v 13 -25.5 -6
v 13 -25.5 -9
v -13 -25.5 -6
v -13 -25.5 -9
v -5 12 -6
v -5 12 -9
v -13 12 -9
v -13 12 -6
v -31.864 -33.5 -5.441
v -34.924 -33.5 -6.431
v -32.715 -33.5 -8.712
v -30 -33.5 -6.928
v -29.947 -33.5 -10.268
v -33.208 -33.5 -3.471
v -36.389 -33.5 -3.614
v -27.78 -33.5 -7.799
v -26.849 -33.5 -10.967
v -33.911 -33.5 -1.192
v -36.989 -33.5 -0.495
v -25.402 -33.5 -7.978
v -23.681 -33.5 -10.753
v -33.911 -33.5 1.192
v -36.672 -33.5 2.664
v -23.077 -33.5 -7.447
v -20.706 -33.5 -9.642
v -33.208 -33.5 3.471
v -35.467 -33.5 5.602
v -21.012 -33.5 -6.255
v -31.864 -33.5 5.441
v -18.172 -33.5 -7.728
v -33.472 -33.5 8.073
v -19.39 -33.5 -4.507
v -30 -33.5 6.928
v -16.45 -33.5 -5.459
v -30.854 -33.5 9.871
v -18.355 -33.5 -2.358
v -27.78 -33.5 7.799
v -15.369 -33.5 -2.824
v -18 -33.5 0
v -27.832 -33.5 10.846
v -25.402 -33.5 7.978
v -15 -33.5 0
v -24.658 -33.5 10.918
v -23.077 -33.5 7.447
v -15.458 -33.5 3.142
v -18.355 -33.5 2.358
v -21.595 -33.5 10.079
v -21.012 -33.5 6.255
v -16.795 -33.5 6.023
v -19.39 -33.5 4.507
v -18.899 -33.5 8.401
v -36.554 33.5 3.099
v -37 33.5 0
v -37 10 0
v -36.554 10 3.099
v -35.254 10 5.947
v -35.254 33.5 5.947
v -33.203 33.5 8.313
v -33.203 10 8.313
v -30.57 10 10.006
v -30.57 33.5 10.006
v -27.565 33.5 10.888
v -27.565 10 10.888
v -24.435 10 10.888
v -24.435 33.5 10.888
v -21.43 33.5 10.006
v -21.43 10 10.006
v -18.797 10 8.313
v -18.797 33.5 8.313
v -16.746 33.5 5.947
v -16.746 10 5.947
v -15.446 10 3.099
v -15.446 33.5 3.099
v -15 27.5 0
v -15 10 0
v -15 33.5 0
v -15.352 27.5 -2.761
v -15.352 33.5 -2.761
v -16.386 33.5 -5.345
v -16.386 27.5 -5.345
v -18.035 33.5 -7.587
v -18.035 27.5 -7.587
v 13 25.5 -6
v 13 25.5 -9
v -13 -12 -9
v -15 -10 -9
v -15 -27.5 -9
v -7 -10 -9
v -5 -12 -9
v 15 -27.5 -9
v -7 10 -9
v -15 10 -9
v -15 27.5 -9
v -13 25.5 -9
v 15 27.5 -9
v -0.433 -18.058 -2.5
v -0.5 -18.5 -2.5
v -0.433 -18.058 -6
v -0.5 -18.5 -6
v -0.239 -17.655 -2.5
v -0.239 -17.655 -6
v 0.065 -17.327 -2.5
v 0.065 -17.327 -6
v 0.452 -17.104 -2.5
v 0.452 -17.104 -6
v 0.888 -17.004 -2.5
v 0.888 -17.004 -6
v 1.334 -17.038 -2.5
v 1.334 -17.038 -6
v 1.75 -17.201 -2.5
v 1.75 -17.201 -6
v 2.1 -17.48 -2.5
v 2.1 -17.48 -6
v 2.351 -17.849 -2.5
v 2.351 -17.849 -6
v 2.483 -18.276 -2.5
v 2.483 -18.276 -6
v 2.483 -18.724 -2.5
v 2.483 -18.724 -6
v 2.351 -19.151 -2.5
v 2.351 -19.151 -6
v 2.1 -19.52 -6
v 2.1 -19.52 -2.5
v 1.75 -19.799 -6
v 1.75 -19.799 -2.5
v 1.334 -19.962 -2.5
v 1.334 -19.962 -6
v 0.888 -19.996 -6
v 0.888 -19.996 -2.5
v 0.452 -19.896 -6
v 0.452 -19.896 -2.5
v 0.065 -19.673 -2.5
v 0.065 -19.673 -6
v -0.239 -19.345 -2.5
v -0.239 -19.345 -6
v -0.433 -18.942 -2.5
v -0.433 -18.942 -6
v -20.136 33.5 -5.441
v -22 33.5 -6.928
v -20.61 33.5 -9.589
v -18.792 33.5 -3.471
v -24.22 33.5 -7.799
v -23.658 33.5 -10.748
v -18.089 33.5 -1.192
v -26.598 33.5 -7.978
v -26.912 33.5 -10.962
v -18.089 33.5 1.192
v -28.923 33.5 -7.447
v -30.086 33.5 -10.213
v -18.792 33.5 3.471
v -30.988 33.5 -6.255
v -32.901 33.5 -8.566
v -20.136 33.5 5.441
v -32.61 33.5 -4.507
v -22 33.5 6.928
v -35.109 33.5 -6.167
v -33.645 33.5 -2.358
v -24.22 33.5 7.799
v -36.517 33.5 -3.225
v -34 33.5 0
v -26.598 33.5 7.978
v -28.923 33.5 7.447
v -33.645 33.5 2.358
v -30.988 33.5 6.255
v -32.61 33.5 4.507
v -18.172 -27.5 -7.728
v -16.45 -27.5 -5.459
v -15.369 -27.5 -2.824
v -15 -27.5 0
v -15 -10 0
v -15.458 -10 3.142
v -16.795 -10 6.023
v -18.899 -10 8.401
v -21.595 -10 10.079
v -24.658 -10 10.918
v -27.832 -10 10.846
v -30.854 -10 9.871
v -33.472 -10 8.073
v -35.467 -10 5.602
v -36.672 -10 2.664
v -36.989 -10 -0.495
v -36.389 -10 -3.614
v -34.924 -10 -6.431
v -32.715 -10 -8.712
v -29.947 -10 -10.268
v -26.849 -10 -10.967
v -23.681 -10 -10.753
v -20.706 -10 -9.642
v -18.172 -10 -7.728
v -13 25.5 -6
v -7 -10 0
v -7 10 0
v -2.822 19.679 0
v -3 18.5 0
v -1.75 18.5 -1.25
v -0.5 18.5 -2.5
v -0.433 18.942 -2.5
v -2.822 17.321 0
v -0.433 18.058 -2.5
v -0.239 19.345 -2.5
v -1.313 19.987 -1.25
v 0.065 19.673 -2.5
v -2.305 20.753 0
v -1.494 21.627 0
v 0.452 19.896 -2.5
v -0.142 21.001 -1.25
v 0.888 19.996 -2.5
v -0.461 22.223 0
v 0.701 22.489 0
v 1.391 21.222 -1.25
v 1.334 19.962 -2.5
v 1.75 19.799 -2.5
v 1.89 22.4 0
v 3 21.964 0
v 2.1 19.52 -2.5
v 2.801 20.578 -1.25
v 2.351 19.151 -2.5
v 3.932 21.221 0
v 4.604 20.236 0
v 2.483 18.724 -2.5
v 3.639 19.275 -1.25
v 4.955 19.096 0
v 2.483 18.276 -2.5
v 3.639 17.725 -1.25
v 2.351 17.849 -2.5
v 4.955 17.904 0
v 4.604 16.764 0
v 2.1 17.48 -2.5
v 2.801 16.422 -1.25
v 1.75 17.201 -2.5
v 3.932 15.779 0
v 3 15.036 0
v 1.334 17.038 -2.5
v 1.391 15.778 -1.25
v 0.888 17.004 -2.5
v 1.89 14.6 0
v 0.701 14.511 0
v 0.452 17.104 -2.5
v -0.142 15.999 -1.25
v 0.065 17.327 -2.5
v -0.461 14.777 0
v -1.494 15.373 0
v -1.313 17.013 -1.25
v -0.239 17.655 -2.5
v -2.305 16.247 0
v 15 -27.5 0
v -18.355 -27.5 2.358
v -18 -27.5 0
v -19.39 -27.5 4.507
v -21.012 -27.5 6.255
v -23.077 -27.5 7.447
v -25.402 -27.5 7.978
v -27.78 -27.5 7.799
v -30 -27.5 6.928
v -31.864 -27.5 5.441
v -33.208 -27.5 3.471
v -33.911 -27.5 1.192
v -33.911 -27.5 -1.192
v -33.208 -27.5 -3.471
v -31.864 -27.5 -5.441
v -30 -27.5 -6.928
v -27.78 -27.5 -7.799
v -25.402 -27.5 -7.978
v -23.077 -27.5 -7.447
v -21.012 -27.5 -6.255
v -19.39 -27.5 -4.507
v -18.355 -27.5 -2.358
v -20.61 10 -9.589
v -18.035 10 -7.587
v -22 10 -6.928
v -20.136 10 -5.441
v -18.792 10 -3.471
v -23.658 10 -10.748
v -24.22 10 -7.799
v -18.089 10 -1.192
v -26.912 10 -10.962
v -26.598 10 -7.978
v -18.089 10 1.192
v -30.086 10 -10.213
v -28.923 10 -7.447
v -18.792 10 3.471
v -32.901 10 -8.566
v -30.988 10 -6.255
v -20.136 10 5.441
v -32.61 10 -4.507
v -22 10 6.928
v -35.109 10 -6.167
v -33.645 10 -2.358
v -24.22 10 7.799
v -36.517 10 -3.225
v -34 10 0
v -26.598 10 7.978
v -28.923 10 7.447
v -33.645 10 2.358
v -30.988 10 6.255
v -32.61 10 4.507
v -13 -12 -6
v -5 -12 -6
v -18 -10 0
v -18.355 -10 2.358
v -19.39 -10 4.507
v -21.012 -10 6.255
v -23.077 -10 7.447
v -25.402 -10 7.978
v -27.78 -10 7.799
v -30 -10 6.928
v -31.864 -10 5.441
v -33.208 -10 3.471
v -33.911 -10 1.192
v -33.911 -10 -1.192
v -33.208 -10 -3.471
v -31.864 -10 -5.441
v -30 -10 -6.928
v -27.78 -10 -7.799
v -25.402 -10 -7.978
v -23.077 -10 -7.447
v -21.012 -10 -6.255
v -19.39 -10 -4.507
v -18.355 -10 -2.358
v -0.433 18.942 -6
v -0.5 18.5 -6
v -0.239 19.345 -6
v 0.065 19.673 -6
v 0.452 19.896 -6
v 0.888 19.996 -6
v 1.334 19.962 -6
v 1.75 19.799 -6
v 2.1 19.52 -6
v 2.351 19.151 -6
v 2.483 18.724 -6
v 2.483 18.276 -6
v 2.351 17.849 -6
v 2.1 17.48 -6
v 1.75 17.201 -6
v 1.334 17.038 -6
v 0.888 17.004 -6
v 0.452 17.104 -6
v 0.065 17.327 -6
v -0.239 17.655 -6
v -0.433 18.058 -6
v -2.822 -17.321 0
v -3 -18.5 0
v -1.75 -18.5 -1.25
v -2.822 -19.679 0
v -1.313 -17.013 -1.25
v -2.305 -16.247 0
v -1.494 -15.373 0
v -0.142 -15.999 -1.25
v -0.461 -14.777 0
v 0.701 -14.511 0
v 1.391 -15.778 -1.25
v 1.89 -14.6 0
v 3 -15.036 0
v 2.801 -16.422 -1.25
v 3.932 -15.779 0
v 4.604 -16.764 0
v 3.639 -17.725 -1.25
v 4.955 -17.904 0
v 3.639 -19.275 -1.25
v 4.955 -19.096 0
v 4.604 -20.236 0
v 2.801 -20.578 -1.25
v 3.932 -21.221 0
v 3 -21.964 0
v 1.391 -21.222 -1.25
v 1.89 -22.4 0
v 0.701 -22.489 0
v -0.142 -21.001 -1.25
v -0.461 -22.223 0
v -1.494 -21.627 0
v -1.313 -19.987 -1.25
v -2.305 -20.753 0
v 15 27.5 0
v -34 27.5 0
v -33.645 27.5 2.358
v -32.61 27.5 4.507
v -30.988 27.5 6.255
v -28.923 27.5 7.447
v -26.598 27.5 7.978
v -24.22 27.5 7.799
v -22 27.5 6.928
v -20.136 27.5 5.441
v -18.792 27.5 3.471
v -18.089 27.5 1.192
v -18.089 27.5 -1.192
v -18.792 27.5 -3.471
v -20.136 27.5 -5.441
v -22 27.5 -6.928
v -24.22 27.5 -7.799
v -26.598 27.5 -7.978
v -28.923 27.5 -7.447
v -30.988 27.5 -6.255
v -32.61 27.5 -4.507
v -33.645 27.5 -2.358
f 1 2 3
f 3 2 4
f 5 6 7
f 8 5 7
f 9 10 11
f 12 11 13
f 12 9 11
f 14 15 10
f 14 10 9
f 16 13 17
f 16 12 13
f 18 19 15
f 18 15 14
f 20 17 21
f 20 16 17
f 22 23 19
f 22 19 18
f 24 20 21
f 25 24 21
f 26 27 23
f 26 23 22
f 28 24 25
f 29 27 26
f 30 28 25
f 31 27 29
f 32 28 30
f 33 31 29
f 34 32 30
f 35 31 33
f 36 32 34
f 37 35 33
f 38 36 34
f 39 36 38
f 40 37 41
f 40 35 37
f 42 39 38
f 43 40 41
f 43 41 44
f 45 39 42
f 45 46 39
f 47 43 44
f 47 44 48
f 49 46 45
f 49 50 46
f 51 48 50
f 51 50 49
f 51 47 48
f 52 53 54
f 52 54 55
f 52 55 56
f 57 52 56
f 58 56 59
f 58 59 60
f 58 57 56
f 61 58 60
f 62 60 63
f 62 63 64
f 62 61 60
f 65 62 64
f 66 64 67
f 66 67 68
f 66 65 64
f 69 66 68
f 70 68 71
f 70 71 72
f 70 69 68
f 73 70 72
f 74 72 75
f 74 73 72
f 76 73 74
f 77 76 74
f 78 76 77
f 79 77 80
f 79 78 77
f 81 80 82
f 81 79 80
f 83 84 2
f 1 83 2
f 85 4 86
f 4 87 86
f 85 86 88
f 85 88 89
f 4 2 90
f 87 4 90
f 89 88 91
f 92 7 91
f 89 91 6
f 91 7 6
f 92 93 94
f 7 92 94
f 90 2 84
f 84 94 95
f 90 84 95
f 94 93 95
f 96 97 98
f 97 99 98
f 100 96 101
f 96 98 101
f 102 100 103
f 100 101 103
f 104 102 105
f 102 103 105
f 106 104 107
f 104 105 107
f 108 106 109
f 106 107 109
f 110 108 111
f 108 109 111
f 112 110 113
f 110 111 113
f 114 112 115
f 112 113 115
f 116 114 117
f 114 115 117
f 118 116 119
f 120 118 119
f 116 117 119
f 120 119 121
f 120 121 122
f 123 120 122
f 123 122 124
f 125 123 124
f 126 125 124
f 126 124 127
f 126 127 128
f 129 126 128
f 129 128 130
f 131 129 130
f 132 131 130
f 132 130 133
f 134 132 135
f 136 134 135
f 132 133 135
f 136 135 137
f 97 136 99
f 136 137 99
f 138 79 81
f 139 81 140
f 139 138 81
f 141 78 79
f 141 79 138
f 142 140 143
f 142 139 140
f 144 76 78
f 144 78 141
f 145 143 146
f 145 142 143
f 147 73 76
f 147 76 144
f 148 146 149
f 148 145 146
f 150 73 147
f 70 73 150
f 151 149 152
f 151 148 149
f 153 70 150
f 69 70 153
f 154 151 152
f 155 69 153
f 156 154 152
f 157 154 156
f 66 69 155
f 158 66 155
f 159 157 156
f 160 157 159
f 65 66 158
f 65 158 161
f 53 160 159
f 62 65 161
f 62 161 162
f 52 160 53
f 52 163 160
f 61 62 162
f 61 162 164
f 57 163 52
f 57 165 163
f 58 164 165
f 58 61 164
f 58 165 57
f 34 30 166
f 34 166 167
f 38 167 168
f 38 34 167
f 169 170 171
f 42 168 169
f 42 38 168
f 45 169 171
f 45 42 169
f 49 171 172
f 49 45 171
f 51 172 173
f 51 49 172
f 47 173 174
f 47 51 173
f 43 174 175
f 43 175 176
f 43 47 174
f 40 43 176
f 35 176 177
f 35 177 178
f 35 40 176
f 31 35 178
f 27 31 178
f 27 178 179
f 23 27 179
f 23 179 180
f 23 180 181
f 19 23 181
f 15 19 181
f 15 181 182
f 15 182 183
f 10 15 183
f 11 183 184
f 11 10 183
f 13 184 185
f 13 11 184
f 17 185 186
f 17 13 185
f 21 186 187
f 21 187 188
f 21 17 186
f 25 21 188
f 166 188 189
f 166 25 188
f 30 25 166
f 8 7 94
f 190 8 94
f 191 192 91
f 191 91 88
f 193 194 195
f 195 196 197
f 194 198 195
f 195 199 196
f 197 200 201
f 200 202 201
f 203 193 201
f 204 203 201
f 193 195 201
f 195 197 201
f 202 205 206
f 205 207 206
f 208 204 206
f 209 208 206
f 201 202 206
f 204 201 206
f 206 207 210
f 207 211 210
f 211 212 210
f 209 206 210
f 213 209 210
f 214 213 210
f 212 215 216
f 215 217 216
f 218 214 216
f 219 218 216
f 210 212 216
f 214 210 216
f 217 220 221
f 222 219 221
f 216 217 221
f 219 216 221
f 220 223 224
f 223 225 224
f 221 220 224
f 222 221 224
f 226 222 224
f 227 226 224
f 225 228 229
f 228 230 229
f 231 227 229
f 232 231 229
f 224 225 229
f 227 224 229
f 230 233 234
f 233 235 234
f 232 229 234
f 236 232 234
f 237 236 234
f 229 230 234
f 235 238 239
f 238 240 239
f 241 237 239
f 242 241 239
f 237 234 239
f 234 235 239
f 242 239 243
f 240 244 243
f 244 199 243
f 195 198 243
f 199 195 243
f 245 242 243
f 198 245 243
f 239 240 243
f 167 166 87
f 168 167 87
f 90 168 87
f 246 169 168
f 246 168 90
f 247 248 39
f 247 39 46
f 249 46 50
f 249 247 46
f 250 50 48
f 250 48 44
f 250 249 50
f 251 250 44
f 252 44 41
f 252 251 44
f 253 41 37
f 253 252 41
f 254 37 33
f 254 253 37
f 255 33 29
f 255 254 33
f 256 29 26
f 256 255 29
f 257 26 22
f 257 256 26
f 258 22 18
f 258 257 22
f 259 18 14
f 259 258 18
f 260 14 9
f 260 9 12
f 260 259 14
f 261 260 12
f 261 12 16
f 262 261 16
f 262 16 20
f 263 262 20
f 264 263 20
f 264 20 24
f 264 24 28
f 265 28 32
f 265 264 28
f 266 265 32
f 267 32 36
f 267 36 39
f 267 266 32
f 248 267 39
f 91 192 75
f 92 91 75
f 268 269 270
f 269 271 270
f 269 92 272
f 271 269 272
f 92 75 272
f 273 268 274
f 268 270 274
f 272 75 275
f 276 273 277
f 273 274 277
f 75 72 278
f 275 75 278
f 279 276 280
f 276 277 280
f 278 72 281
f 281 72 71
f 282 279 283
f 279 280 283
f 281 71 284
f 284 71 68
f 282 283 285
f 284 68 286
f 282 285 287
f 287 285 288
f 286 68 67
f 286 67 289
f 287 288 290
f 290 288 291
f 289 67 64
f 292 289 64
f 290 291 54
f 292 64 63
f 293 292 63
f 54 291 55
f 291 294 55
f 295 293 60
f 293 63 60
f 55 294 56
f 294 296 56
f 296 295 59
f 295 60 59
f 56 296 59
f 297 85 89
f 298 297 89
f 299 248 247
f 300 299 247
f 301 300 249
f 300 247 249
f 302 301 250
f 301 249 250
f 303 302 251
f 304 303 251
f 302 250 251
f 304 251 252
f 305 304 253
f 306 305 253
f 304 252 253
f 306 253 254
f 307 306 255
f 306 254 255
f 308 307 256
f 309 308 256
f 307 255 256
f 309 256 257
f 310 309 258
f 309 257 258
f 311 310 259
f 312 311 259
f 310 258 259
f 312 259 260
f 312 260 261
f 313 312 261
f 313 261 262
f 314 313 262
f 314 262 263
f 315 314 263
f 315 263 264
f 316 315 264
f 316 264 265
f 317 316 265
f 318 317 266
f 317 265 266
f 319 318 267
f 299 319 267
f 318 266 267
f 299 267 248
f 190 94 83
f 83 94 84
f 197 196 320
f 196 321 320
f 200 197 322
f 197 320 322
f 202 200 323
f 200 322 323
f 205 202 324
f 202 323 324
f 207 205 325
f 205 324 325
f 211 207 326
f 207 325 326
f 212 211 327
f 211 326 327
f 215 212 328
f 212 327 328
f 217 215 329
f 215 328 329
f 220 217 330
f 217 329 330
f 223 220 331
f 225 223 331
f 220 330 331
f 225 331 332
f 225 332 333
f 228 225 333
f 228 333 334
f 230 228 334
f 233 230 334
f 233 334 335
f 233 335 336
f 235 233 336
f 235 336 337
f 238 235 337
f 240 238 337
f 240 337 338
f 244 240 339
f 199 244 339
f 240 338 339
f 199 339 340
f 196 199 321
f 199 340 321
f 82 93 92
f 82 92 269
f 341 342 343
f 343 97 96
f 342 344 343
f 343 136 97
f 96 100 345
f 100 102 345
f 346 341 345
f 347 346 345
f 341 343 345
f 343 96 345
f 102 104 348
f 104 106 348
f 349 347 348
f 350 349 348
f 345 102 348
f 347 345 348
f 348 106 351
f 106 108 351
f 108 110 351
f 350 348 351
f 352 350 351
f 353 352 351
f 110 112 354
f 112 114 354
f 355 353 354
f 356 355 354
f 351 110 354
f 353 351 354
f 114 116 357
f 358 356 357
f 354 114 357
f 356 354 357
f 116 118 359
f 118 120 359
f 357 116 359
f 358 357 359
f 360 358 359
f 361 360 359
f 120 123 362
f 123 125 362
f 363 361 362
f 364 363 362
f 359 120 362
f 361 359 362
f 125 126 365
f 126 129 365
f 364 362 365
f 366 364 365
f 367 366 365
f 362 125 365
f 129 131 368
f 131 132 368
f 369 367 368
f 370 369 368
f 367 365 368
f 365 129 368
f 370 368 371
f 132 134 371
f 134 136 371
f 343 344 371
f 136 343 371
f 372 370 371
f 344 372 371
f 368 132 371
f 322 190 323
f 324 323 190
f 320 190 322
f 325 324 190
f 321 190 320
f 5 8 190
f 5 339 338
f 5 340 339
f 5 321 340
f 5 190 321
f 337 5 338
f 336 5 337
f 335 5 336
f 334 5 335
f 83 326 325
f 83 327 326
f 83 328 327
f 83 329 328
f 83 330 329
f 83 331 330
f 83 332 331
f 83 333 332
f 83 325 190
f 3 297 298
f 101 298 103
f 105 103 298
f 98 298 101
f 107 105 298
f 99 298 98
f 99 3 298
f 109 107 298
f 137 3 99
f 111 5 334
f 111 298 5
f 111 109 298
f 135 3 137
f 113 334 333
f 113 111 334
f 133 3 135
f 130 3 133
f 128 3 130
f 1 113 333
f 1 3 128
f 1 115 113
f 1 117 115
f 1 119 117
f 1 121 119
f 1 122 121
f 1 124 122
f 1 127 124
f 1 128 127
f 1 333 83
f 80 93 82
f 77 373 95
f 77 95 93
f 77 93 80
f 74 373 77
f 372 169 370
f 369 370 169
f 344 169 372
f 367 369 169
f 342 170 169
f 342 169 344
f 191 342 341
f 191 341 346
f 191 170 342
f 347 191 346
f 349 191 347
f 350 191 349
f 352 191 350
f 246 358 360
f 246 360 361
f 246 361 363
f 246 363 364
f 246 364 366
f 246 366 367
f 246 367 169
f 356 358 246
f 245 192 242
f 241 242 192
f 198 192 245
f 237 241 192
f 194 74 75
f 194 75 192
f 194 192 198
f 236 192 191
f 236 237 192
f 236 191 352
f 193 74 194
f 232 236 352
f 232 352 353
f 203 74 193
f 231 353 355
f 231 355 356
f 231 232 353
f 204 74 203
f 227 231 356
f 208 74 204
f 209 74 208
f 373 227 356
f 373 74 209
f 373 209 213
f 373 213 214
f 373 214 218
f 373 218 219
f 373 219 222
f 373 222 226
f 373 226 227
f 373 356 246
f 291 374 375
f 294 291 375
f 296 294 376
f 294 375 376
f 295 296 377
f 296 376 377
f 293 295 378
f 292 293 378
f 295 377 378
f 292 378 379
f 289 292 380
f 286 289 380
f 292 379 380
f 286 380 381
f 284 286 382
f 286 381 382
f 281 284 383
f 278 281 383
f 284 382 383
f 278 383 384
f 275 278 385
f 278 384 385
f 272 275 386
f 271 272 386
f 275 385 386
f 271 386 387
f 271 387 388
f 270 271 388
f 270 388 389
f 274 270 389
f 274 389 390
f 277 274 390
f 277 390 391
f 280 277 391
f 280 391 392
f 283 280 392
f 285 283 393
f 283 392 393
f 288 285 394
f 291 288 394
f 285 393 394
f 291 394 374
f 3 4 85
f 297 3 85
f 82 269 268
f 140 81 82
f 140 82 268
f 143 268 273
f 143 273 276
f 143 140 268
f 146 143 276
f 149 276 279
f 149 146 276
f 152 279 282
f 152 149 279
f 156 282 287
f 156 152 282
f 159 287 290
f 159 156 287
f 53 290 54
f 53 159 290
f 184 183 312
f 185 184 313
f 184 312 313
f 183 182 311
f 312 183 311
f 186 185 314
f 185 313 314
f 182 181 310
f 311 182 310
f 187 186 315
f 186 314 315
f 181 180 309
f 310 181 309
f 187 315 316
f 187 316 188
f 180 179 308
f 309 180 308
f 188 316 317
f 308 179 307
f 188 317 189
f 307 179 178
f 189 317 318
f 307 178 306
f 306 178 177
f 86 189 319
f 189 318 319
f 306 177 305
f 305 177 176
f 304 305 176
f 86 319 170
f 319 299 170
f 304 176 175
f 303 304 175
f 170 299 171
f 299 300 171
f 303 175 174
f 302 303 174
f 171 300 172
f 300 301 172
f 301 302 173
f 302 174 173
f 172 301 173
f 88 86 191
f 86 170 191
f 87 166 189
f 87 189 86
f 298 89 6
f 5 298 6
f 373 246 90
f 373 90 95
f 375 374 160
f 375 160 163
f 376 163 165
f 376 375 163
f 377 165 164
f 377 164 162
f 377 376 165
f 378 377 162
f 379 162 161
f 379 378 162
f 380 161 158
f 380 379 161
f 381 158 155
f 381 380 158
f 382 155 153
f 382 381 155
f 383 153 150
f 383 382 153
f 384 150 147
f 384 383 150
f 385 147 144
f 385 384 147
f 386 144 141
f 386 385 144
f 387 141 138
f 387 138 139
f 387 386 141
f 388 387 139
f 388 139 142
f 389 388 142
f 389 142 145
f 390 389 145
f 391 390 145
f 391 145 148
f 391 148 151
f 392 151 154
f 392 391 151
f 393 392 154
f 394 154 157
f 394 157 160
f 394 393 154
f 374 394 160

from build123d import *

# Parameters (mm, degrees)
F1_DEPTH        = 9
F3_DEPTH        = 3
F4_R            = 8
F5_DEPTH        = 6
F5_DEPTH_BACK   = 17.5
F6_DEPTH        = 17.5
F7_R            = 8
F8_DEPTH        = 17.5
F8_DEPTH_BACK   = 6
F9_DEPTH        = 17.5
F11_D           = 3
F11_CSINK_D     = 8
F11_CSINK_ANGLE = 90


with BuildPart() as f1:
    # F0 (on Top) → F1 (new body)
    with BuildSketch(Plane.XY):
        Polygon((-15, -10), (-15, -27.5), (0, -27.5), (0, 0), (0, 27.5), (-15, 27.5), (-15, 10), (-7, 10), (-7, 0), (-7, -10), align=None)
        Polygon((0, 0), (0, -27.5), (15, -27.5), (15, 0), (15, 27.5), (0, 27.5), align=None)
    extrude(amount=-F1_DEPTH)

    # F2 (on face) → F3 (cut)
    with BuildSketch(Plane(origin=(0, 0, -9), x_dir=(1, 0, 0), z_dir=(0, 0, -1))):
        Polygon((-13, 25.5), (-13, 12), (-7, 12), (-5, 12), (-5, 10), (-5, -10), (-5, -12), (-7, -12), (-13, -12), (-13, -25.5), (13, -25.5), (13, 25.5), align=None)
    extrude(amount=-F3_DEPTH, mode=Mode.SUBTRACT)

    # F4 (on face) → F5 (join, two sides)
    with BuildSketch(Plane.XZ.offset(27.5)) as f5_sk:
        with BuildLine():
            ThreePointArc((-18.172145319, -7.7281751464), (-15.8238906872, -4.1769365873), (-15, 0))
            ThreePointArc((-15, 0), (-36.1761093128, 4.1769365873), (-18.172145319, -7.7281751464))
        make_face()
        with Locations((-26, 0)):
            Circle(F4_R, mode=Mode.SUBTRACT)
    extrude(amount=F5_DEPTH)
    extrude(f5_sk.sketch, amount=-F5_DEPTH_BACK)

    # F4 (on face) → F6 (join)
    with BuildSketch(Plane.XZ.offset(27.5)):
        with BuildLine():
            Line((-15, -9), (-15, 0))
            ThreePointArc((-15, 0), (-15.8238906872, -4.1769365873), (-18.172145319, -7.7281751464))
            Line((-18.172145319, -7.7281751464), (-15, -9))
        make_face()
    extrude(amount=-F6_DEPTH)

    # F7 (on face) → F8 (join, two sides)
    with BuildSketch(Plane(origin=(0, 27.5, 0), x_dir=(-1, 0, 0), z_dir=(0, 1, 0))) as f8_sk:
        with BuildLine():
            ThreePointArc((18.0354576911, -7.5872304439), (30.0859536587, -10.2129810878), (37, 0))
            ThreePointArc((37, 0), (26, 11), (15, 0))
            ThreePointArc((15, 0), (15.7870189122, -4.0859536587), (18.0354576911, -7.5872304439))
        make_face()
        with Locations((26, 0)):
            Circle(F7_R, mode=Mode.SUBTRACT)
    extrude(amount=-F8_DEPTH)
    extrude(f8_sk.sketch, amount=F8_DEPTH_BACK)

    # F7 (on face) → F9 (join)
    with BuildSketch(Plane(origin=(0, 27.5, 0), x_dir=(-1, 0, 0), z_dir=(0, 1, 0))):
        with BuildLine():
            ThreePointArc((18.0354576911, -7.5872304439), (15.7870189122, -4.0859536587), (15, 0))
            Line((15, 0), (15, -9))
            Line((15, -9), (18.0354576911, -7.5872304439))
        make_face()
    extrude(amount=-F9_DEPTH)

    # F11 (through all)
    with Locations(Plane.XY):
        with Locations((1, 18.5), (1, -18.5)):
            CounterSinkHole(F11_D / 2, F11_CSINK_D / 2, counter_sink_angle=F11_CSINK_ANGLE)


solid = f1.part
